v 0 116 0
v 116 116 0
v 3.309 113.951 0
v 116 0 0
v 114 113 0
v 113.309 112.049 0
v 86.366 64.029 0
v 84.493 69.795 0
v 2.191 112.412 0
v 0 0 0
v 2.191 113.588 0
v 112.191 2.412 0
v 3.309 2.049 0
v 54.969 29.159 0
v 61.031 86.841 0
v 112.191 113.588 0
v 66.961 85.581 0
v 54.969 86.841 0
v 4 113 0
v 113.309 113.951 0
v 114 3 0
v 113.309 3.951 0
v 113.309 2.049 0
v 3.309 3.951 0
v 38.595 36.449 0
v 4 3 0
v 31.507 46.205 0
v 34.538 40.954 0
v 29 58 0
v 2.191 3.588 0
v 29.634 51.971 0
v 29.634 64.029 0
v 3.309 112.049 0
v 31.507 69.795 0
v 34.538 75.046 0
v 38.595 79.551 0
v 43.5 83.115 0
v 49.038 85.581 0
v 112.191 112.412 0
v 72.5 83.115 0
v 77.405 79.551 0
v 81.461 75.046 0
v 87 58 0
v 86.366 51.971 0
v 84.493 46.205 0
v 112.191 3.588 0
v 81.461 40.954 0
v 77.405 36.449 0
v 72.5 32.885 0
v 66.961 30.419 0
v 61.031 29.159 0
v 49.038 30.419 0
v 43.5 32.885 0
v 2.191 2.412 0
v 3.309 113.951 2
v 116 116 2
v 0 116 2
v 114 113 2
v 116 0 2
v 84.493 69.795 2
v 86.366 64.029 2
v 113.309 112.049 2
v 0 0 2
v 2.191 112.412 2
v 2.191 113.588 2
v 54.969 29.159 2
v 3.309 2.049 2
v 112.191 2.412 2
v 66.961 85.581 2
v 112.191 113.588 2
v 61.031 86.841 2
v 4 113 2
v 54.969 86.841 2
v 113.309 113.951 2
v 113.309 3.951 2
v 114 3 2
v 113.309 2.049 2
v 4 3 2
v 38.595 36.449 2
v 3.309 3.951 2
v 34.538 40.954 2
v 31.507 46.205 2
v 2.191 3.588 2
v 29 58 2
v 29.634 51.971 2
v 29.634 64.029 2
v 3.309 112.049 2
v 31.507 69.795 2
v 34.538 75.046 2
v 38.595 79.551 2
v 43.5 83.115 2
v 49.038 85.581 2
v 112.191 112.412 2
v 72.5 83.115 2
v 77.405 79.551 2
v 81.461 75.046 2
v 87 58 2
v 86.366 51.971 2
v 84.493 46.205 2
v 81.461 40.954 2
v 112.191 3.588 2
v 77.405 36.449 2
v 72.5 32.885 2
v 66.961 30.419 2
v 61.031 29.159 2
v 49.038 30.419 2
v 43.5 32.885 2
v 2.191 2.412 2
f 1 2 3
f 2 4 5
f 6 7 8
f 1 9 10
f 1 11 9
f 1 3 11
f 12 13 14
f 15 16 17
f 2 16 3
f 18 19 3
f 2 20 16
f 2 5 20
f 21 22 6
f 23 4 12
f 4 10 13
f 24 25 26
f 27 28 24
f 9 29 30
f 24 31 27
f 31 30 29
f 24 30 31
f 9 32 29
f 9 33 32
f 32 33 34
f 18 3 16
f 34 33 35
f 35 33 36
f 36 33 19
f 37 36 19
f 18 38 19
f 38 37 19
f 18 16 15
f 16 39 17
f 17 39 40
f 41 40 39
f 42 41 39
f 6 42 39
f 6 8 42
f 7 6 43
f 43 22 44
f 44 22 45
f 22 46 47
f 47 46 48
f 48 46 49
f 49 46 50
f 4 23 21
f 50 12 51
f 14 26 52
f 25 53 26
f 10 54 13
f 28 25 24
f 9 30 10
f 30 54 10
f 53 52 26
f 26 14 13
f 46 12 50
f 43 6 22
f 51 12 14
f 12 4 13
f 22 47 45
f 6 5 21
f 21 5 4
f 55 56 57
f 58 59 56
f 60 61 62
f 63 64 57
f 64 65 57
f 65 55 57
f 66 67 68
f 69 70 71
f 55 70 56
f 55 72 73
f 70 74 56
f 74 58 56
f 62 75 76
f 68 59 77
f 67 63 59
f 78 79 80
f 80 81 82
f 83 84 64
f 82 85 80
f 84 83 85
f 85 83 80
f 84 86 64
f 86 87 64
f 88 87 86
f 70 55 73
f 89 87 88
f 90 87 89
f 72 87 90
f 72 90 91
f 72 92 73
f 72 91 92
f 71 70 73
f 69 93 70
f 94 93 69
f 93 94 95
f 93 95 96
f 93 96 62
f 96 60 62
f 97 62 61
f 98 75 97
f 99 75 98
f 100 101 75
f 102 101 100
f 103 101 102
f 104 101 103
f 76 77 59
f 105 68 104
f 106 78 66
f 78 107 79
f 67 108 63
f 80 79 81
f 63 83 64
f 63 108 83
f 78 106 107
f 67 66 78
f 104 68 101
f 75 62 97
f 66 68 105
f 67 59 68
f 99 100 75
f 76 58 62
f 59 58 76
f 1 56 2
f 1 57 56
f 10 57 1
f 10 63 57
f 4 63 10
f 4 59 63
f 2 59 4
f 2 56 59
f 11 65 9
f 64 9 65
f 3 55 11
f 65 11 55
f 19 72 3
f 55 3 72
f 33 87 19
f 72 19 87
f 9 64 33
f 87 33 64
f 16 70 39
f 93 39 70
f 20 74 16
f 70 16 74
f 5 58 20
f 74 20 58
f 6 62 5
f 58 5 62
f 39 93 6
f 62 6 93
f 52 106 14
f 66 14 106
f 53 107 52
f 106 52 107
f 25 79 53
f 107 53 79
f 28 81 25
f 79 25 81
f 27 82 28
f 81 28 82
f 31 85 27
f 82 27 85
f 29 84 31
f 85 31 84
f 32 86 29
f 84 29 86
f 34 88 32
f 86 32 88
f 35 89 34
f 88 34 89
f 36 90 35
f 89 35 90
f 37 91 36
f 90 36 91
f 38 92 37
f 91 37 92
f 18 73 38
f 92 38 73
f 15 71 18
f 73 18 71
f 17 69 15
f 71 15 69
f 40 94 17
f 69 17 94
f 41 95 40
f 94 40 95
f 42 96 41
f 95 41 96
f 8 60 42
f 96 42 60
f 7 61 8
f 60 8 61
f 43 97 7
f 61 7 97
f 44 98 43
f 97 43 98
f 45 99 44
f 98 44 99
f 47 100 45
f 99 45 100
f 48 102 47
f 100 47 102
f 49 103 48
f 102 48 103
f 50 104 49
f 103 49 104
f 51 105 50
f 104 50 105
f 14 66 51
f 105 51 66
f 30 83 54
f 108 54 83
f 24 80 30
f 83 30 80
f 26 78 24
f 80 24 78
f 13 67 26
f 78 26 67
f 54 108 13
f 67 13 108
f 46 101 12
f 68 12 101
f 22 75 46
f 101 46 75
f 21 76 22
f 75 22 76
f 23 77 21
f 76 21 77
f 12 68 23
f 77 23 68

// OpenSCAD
diam_button = 58;
wall_thickness = 2;
screw_diam = 2;

plate = diam_button * 2;

module base_top_plate() {
difference(){
    square(plate);
    translate([plate/2, plate/2, 0]){
        circle(diam_button/2);
    }
}
}


module top_plate(){
    hole_diameter = screw_diam / 2;
    move = wall_thickness+hole_diameter;
    difference(){
        base_top_plate();
        translate([move, move, 0]){
            circle(hole_diameter);
        }
        translate([move, plate-move, 0]){
            circle(hole_diameter);
        }
        translate([plate-move, move, 0]){
            circle(hole_diameter);
        }
        translate([plate-move, plate-move, 0]){
            circle(hole_diameter);
        }
    }
}

linear_extrude(2){
    top_plate();
}
